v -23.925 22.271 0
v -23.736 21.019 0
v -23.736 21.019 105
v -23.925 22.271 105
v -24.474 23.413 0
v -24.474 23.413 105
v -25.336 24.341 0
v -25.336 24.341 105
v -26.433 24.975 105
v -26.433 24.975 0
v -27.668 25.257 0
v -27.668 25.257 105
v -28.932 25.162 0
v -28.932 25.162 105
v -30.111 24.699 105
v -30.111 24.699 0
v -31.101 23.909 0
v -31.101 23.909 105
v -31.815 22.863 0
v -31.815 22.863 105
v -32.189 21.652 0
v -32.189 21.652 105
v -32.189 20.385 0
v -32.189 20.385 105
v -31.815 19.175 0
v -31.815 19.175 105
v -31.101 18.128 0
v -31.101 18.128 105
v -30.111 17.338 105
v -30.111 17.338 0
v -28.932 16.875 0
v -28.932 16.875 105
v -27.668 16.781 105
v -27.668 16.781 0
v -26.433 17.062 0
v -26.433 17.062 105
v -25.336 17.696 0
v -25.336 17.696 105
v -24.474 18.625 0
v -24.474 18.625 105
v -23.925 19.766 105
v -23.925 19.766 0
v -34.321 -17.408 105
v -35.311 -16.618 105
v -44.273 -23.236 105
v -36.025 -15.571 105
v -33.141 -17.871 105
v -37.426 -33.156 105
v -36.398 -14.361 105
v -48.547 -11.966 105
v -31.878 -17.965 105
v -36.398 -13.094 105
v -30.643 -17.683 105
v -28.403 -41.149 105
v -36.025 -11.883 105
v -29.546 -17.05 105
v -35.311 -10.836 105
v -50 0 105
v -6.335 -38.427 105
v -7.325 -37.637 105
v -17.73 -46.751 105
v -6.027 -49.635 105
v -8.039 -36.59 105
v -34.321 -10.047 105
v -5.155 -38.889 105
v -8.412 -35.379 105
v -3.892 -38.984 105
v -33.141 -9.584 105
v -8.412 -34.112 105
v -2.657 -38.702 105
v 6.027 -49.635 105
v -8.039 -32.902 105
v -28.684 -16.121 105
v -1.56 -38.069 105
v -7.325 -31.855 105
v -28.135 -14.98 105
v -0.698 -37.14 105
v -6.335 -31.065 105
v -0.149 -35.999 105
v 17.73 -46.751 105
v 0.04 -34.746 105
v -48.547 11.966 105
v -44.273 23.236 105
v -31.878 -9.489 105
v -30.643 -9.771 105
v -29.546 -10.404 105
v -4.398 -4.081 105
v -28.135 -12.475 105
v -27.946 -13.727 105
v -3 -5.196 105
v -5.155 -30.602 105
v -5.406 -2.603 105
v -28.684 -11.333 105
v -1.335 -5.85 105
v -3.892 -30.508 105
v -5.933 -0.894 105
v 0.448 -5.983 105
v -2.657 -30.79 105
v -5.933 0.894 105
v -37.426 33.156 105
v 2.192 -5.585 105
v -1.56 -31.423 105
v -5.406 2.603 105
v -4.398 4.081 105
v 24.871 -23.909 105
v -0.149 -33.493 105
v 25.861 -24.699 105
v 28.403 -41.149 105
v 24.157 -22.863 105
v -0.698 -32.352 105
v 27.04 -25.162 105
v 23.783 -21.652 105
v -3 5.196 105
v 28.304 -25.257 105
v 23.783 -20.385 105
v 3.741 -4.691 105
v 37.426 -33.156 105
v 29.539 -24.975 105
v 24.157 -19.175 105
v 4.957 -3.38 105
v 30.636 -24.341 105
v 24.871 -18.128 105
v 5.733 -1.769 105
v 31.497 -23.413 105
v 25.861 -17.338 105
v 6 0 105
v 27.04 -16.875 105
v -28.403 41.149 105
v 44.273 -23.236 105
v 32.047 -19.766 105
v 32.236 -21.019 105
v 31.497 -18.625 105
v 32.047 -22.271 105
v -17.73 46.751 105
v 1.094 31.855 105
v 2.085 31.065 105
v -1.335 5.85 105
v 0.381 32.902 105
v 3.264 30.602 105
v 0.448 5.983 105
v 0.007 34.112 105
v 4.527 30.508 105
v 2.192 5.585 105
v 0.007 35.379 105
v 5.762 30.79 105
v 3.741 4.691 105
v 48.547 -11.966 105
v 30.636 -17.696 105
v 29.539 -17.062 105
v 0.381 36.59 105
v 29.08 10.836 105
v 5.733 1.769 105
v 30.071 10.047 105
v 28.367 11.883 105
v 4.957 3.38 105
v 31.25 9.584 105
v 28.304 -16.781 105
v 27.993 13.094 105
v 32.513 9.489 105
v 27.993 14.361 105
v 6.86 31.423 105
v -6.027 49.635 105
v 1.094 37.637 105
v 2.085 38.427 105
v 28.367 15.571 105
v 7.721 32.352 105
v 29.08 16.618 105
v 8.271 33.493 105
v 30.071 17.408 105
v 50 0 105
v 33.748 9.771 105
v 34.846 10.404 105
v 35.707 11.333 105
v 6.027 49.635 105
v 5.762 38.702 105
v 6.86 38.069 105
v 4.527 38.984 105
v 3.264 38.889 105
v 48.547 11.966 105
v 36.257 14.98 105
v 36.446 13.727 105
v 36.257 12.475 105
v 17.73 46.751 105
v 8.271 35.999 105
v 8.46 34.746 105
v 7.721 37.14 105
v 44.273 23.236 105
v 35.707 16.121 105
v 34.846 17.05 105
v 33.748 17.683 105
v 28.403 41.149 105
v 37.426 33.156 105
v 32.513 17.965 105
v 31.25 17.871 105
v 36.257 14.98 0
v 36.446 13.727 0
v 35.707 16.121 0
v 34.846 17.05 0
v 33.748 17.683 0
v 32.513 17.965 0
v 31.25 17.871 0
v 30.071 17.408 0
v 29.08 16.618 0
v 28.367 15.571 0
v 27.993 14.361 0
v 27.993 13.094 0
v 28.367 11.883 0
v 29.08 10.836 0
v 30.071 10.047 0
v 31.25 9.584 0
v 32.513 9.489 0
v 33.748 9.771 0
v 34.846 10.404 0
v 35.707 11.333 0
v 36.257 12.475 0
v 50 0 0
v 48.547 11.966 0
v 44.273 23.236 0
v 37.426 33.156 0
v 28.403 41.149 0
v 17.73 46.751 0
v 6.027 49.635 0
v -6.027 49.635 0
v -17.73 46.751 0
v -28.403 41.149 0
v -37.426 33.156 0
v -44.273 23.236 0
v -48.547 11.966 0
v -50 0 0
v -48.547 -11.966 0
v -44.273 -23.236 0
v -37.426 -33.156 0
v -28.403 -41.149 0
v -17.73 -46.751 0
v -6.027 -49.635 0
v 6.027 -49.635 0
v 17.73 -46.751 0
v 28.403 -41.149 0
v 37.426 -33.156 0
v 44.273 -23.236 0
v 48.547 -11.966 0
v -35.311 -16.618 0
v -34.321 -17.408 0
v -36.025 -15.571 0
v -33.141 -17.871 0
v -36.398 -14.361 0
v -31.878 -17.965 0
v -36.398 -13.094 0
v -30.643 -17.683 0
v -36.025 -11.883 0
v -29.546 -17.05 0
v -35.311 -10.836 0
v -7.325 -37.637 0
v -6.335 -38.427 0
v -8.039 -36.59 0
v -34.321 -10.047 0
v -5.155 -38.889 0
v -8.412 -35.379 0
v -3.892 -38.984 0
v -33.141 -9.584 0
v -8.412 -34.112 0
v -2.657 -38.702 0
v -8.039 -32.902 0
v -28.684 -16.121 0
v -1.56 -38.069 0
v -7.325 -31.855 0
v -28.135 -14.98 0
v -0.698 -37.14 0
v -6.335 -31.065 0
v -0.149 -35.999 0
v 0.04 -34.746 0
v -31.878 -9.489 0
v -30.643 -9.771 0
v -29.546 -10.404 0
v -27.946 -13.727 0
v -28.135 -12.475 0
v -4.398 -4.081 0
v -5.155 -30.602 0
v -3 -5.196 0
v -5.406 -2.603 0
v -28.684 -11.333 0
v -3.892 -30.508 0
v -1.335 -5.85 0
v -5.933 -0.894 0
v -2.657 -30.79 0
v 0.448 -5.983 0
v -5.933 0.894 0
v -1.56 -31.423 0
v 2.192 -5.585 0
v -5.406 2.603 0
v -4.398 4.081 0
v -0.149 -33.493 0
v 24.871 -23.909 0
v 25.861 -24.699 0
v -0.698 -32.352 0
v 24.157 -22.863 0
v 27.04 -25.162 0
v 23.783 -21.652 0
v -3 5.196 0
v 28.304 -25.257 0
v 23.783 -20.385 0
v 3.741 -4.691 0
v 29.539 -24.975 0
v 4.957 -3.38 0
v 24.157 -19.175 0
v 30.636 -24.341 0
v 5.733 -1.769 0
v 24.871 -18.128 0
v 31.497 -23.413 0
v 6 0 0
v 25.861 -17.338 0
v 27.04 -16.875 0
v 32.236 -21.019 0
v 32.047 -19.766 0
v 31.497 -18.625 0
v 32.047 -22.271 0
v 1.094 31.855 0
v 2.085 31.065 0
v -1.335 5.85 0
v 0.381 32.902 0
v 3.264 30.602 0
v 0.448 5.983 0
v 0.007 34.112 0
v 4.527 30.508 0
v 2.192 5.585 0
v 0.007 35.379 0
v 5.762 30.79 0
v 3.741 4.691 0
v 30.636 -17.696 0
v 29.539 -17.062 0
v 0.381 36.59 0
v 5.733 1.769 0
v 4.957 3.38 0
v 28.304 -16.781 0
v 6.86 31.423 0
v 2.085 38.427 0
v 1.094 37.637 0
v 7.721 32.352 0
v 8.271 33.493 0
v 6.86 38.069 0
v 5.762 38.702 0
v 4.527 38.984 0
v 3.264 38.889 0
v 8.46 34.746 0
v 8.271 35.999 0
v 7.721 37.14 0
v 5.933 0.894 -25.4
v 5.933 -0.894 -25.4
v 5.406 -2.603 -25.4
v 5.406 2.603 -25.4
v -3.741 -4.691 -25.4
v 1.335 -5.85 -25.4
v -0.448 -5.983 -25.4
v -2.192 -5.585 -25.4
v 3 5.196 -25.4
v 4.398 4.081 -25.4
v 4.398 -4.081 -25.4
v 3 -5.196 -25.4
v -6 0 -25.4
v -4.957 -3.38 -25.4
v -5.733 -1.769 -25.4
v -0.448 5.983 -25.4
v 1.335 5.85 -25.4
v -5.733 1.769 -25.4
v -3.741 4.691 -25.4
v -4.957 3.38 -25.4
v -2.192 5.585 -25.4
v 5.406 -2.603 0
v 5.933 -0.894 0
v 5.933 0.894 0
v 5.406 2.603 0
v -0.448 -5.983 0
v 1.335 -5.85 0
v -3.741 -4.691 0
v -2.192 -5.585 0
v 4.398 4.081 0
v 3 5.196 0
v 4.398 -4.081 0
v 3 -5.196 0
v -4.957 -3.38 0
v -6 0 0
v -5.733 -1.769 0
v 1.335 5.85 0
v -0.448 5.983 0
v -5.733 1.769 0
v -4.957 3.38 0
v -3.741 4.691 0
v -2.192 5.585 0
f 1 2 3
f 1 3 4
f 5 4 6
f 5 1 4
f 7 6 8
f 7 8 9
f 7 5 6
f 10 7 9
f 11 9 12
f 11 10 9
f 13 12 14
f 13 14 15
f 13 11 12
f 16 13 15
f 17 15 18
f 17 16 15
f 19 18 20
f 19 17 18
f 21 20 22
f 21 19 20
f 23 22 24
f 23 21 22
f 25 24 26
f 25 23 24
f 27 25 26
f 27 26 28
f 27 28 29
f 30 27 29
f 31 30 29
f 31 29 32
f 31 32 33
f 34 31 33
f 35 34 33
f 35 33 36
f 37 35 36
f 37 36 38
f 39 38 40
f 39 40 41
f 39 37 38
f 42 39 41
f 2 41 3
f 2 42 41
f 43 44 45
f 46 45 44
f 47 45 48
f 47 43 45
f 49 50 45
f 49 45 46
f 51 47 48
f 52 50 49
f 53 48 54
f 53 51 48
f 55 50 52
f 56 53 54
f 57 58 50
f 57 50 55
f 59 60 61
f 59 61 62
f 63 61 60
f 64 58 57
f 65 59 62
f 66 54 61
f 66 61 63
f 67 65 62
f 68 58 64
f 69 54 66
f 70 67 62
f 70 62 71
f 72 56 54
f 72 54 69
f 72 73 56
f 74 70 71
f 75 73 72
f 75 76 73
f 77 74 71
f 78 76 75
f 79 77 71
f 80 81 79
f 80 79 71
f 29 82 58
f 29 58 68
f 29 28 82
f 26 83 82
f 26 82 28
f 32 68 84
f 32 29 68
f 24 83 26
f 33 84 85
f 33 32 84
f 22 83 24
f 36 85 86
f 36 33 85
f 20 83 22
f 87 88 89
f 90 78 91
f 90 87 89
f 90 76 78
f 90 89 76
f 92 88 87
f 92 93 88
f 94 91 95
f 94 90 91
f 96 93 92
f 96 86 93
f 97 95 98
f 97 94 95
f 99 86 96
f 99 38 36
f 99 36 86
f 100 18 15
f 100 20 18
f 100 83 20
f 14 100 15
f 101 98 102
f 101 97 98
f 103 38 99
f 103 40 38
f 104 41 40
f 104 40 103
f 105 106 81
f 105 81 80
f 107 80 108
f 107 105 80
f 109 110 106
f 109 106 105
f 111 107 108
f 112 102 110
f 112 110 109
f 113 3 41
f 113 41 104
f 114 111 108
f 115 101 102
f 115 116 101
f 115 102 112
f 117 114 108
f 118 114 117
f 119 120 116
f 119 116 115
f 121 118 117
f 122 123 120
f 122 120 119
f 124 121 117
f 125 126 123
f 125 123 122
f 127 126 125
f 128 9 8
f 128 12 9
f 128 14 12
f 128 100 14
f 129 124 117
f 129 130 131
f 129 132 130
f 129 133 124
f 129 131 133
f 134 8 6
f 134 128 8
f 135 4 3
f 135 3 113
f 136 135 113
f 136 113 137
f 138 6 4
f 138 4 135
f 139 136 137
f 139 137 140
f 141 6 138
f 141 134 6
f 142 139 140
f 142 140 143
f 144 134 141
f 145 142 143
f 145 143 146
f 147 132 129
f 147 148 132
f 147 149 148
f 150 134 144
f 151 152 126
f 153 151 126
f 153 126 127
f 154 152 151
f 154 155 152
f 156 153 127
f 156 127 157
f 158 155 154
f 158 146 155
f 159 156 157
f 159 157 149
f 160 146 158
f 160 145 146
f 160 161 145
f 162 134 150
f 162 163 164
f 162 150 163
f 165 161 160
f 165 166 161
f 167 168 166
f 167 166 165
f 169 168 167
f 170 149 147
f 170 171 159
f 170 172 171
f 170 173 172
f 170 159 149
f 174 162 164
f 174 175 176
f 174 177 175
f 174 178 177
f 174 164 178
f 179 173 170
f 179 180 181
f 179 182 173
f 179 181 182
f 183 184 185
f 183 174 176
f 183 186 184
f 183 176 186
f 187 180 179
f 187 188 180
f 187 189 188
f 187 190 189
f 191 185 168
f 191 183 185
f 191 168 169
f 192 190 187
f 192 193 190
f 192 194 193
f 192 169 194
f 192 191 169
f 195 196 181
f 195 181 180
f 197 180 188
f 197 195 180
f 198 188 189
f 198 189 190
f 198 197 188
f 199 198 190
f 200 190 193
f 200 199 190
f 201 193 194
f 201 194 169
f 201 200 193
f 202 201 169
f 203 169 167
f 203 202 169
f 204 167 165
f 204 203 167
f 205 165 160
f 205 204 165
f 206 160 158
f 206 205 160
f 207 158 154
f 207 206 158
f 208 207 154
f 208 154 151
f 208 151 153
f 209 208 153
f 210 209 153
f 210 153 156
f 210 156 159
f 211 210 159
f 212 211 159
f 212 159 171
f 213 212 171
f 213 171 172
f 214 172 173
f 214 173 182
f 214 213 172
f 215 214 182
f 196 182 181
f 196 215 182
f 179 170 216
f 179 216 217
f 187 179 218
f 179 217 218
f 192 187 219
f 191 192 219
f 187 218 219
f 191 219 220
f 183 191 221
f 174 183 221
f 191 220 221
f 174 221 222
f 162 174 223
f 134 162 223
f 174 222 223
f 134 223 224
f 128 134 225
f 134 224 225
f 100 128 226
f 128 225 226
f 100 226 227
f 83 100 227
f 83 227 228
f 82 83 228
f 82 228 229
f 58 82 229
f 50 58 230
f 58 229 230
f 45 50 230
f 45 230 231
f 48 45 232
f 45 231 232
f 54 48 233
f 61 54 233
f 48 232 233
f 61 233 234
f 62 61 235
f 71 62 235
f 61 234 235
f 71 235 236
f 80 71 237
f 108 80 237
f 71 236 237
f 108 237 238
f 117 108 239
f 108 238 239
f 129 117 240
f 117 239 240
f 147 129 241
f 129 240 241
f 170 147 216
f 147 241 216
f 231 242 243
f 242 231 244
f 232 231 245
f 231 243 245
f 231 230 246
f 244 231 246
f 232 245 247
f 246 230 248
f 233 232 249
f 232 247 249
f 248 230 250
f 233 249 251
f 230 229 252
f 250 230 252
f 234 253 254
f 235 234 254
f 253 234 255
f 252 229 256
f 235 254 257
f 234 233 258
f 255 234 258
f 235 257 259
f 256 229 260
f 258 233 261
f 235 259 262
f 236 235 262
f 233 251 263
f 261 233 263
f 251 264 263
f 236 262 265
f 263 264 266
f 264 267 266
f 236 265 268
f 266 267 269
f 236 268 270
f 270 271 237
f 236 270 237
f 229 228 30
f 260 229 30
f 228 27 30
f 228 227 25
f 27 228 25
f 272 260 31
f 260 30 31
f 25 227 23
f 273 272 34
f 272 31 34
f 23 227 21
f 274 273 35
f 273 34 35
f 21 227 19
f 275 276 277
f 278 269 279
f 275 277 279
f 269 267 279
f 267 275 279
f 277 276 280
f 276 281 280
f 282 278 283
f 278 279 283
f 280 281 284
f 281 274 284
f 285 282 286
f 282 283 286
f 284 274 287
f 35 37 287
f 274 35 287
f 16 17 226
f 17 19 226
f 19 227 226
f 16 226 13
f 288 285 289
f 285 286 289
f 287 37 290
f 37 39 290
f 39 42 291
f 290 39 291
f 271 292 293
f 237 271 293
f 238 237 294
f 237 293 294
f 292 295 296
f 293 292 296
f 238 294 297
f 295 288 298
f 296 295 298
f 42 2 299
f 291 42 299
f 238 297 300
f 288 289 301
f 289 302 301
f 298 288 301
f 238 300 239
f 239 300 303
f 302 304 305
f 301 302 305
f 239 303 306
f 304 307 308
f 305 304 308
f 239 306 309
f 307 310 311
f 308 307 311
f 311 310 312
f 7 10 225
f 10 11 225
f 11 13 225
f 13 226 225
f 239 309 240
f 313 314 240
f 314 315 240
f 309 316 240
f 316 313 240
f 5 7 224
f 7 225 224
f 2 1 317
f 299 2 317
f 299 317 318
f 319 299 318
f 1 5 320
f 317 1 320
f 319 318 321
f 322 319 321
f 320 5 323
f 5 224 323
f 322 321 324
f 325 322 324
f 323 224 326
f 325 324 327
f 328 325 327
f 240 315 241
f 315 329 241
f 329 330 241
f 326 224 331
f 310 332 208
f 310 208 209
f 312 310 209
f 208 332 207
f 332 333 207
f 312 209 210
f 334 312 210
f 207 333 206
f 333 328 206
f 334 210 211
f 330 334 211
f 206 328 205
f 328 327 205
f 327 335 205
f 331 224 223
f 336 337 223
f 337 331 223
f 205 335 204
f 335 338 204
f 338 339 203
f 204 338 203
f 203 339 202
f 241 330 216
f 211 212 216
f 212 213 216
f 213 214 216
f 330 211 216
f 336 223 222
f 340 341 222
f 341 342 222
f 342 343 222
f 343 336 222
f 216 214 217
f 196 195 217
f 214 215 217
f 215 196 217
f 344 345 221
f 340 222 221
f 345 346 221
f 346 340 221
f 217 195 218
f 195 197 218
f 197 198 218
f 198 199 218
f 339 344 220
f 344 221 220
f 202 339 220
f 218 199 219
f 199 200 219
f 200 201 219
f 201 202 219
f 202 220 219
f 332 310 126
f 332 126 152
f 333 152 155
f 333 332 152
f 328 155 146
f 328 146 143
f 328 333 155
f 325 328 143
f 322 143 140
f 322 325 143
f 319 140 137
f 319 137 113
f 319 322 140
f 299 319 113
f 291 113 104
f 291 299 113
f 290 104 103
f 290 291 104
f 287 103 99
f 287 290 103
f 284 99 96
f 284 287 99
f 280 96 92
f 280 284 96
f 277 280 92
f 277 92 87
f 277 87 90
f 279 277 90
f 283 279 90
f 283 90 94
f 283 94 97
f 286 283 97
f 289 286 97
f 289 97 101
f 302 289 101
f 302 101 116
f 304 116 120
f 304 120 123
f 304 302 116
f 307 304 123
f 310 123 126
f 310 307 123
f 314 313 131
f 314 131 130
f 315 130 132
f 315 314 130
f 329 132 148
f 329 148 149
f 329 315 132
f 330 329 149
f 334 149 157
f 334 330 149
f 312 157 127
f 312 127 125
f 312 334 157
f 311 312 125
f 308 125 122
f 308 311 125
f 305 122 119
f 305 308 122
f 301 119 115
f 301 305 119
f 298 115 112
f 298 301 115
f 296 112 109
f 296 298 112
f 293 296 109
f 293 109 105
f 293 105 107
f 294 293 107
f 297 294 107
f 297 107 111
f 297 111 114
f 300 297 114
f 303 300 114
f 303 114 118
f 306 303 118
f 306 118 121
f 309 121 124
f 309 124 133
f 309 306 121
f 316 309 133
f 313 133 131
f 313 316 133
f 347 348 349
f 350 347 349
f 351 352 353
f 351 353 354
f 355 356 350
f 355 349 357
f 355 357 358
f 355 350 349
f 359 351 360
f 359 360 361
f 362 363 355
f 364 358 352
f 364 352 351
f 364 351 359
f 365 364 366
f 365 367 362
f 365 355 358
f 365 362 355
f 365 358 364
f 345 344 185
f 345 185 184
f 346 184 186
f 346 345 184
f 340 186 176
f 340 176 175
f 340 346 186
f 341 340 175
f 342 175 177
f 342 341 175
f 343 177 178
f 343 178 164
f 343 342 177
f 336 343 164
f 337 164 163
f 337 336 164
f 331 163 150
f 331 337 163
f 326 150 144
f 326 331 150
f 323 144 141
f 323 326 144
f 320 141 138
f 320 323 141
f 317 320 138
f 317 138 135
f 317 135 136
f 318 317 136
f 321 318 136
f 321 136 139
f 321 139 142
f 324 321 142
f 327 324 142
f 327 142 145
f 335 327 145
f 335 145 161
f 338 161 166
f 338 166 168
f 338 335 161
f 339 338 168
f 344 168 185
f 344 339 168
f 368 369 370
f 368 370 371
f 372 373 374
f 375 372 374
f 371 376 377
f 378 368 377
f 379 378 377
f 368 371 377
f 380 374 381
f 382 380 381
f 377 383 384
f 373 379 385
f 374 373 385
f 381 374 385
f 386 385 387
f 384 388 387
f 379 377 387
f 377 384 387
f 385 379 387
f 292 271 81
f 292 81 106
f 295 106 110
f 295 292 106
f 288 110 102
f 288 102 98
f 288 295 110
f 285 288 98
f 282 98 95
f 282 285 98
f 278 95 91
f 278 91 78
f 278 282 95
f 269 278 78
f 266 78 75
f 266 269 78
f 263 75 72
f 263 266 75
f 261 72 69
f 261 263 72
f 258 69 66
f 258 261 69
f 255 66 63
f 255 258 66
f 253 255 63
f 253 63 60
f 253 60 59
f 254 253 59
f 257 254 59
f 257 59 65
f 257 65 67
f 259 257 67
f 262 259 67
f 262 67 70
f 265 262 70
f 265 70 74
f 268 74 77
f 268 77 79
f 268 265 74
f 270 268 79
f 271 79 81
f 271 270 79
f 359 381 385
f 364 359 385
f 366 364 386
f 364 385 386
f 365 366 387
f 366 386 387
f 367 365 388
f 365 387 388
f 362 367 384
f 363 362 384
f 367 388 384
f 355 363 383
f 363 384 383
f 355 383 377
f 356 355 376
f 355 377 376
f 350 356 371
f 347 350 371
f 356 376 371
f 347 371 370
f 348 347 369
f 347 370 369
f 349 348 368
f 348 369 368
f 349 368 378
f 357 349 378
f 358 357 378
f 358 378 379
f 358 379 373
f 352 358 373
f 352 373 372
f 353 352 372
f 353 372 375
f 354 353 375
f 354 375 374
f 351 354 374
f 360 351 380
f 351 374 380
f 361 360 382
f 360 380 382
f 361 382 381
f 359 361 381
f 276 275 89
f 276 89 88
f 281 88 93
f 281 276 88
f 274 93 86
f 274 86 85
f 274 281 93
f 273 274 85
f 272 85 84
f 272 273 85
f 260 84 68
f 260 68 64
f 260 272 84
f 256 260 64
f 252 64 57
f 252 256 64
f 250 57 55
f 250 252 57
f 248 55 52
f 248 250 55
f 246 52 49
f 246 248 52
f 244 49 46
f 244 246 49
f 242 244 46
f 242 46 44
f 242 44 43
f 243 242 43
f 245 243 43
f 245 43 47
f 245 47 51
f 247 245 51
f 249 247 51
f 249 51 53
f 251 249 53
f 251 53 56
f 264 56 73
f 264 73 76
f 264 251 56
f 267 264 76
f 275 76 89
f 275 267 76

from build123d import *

# Parameters (mm, degrees)
SKETCH1_R           = 50
SKETCH1_R_2         = 4.25
SKETCH1_R_3         = 6
BOSS_EXTRUDE1_DEPTH = 105
SKETCH2_R           = 6
BOSS_EXTRUDE2_DEPTH = 25.4


with BuildPart() as part:
    # Sketch1 → Boss-Extrude1 (new body)
    with BuildSketch(Plane.XY):
        Circle(SKETCH1_R)
        with Locations((-27.985970979, 21.018692356)):
            Circle(SKETCH1_R_2, mode=Mode.SUBTRACT)
        with Locations((4.209736046, 34.745907995)):
            Circle(SKETCH1_R_2, mode=Mode.SUBTRACT)
        with Locations((32.195707024, 13.727215639)):
            Circle(SKETCH1_R_2, mode=Mode.SUBTRACT)
        with Locations((27.985970979, -21.018692356)):
            Circle(SKETCH1_R_2, mode=Mode.SUBTRACT)
        with Locations((-4.209736046, -34.745907995)):
            Circle(SKETCH1_R_2, mode=Mode.SUBTRACT)
        with Locations((-32.195707024, -13.727215639)):
            Circle(SKETCH1_R_2, mode=Mode.SUBTRACT)
        Circle(SKETCH1_R_3, mode=Mode.SUBTRACT)
    extrude(amount=BOSS_EXTRUDE1_DEPTH)


with BuildPart() as body_2:
    # Sketch2 → Boss-Extrude2 (new body)
    with BuildSketch(Plane(origin=(0, 0, 0), x_dir=(-1, 0, 0), z_dir=(0, 0, -1))):
        Circle(SKETCH2_R)
    extrude(amount=BOSS_EXTRUDE2_DEPTH)


solid = Compound([part.part, body_2.part])
